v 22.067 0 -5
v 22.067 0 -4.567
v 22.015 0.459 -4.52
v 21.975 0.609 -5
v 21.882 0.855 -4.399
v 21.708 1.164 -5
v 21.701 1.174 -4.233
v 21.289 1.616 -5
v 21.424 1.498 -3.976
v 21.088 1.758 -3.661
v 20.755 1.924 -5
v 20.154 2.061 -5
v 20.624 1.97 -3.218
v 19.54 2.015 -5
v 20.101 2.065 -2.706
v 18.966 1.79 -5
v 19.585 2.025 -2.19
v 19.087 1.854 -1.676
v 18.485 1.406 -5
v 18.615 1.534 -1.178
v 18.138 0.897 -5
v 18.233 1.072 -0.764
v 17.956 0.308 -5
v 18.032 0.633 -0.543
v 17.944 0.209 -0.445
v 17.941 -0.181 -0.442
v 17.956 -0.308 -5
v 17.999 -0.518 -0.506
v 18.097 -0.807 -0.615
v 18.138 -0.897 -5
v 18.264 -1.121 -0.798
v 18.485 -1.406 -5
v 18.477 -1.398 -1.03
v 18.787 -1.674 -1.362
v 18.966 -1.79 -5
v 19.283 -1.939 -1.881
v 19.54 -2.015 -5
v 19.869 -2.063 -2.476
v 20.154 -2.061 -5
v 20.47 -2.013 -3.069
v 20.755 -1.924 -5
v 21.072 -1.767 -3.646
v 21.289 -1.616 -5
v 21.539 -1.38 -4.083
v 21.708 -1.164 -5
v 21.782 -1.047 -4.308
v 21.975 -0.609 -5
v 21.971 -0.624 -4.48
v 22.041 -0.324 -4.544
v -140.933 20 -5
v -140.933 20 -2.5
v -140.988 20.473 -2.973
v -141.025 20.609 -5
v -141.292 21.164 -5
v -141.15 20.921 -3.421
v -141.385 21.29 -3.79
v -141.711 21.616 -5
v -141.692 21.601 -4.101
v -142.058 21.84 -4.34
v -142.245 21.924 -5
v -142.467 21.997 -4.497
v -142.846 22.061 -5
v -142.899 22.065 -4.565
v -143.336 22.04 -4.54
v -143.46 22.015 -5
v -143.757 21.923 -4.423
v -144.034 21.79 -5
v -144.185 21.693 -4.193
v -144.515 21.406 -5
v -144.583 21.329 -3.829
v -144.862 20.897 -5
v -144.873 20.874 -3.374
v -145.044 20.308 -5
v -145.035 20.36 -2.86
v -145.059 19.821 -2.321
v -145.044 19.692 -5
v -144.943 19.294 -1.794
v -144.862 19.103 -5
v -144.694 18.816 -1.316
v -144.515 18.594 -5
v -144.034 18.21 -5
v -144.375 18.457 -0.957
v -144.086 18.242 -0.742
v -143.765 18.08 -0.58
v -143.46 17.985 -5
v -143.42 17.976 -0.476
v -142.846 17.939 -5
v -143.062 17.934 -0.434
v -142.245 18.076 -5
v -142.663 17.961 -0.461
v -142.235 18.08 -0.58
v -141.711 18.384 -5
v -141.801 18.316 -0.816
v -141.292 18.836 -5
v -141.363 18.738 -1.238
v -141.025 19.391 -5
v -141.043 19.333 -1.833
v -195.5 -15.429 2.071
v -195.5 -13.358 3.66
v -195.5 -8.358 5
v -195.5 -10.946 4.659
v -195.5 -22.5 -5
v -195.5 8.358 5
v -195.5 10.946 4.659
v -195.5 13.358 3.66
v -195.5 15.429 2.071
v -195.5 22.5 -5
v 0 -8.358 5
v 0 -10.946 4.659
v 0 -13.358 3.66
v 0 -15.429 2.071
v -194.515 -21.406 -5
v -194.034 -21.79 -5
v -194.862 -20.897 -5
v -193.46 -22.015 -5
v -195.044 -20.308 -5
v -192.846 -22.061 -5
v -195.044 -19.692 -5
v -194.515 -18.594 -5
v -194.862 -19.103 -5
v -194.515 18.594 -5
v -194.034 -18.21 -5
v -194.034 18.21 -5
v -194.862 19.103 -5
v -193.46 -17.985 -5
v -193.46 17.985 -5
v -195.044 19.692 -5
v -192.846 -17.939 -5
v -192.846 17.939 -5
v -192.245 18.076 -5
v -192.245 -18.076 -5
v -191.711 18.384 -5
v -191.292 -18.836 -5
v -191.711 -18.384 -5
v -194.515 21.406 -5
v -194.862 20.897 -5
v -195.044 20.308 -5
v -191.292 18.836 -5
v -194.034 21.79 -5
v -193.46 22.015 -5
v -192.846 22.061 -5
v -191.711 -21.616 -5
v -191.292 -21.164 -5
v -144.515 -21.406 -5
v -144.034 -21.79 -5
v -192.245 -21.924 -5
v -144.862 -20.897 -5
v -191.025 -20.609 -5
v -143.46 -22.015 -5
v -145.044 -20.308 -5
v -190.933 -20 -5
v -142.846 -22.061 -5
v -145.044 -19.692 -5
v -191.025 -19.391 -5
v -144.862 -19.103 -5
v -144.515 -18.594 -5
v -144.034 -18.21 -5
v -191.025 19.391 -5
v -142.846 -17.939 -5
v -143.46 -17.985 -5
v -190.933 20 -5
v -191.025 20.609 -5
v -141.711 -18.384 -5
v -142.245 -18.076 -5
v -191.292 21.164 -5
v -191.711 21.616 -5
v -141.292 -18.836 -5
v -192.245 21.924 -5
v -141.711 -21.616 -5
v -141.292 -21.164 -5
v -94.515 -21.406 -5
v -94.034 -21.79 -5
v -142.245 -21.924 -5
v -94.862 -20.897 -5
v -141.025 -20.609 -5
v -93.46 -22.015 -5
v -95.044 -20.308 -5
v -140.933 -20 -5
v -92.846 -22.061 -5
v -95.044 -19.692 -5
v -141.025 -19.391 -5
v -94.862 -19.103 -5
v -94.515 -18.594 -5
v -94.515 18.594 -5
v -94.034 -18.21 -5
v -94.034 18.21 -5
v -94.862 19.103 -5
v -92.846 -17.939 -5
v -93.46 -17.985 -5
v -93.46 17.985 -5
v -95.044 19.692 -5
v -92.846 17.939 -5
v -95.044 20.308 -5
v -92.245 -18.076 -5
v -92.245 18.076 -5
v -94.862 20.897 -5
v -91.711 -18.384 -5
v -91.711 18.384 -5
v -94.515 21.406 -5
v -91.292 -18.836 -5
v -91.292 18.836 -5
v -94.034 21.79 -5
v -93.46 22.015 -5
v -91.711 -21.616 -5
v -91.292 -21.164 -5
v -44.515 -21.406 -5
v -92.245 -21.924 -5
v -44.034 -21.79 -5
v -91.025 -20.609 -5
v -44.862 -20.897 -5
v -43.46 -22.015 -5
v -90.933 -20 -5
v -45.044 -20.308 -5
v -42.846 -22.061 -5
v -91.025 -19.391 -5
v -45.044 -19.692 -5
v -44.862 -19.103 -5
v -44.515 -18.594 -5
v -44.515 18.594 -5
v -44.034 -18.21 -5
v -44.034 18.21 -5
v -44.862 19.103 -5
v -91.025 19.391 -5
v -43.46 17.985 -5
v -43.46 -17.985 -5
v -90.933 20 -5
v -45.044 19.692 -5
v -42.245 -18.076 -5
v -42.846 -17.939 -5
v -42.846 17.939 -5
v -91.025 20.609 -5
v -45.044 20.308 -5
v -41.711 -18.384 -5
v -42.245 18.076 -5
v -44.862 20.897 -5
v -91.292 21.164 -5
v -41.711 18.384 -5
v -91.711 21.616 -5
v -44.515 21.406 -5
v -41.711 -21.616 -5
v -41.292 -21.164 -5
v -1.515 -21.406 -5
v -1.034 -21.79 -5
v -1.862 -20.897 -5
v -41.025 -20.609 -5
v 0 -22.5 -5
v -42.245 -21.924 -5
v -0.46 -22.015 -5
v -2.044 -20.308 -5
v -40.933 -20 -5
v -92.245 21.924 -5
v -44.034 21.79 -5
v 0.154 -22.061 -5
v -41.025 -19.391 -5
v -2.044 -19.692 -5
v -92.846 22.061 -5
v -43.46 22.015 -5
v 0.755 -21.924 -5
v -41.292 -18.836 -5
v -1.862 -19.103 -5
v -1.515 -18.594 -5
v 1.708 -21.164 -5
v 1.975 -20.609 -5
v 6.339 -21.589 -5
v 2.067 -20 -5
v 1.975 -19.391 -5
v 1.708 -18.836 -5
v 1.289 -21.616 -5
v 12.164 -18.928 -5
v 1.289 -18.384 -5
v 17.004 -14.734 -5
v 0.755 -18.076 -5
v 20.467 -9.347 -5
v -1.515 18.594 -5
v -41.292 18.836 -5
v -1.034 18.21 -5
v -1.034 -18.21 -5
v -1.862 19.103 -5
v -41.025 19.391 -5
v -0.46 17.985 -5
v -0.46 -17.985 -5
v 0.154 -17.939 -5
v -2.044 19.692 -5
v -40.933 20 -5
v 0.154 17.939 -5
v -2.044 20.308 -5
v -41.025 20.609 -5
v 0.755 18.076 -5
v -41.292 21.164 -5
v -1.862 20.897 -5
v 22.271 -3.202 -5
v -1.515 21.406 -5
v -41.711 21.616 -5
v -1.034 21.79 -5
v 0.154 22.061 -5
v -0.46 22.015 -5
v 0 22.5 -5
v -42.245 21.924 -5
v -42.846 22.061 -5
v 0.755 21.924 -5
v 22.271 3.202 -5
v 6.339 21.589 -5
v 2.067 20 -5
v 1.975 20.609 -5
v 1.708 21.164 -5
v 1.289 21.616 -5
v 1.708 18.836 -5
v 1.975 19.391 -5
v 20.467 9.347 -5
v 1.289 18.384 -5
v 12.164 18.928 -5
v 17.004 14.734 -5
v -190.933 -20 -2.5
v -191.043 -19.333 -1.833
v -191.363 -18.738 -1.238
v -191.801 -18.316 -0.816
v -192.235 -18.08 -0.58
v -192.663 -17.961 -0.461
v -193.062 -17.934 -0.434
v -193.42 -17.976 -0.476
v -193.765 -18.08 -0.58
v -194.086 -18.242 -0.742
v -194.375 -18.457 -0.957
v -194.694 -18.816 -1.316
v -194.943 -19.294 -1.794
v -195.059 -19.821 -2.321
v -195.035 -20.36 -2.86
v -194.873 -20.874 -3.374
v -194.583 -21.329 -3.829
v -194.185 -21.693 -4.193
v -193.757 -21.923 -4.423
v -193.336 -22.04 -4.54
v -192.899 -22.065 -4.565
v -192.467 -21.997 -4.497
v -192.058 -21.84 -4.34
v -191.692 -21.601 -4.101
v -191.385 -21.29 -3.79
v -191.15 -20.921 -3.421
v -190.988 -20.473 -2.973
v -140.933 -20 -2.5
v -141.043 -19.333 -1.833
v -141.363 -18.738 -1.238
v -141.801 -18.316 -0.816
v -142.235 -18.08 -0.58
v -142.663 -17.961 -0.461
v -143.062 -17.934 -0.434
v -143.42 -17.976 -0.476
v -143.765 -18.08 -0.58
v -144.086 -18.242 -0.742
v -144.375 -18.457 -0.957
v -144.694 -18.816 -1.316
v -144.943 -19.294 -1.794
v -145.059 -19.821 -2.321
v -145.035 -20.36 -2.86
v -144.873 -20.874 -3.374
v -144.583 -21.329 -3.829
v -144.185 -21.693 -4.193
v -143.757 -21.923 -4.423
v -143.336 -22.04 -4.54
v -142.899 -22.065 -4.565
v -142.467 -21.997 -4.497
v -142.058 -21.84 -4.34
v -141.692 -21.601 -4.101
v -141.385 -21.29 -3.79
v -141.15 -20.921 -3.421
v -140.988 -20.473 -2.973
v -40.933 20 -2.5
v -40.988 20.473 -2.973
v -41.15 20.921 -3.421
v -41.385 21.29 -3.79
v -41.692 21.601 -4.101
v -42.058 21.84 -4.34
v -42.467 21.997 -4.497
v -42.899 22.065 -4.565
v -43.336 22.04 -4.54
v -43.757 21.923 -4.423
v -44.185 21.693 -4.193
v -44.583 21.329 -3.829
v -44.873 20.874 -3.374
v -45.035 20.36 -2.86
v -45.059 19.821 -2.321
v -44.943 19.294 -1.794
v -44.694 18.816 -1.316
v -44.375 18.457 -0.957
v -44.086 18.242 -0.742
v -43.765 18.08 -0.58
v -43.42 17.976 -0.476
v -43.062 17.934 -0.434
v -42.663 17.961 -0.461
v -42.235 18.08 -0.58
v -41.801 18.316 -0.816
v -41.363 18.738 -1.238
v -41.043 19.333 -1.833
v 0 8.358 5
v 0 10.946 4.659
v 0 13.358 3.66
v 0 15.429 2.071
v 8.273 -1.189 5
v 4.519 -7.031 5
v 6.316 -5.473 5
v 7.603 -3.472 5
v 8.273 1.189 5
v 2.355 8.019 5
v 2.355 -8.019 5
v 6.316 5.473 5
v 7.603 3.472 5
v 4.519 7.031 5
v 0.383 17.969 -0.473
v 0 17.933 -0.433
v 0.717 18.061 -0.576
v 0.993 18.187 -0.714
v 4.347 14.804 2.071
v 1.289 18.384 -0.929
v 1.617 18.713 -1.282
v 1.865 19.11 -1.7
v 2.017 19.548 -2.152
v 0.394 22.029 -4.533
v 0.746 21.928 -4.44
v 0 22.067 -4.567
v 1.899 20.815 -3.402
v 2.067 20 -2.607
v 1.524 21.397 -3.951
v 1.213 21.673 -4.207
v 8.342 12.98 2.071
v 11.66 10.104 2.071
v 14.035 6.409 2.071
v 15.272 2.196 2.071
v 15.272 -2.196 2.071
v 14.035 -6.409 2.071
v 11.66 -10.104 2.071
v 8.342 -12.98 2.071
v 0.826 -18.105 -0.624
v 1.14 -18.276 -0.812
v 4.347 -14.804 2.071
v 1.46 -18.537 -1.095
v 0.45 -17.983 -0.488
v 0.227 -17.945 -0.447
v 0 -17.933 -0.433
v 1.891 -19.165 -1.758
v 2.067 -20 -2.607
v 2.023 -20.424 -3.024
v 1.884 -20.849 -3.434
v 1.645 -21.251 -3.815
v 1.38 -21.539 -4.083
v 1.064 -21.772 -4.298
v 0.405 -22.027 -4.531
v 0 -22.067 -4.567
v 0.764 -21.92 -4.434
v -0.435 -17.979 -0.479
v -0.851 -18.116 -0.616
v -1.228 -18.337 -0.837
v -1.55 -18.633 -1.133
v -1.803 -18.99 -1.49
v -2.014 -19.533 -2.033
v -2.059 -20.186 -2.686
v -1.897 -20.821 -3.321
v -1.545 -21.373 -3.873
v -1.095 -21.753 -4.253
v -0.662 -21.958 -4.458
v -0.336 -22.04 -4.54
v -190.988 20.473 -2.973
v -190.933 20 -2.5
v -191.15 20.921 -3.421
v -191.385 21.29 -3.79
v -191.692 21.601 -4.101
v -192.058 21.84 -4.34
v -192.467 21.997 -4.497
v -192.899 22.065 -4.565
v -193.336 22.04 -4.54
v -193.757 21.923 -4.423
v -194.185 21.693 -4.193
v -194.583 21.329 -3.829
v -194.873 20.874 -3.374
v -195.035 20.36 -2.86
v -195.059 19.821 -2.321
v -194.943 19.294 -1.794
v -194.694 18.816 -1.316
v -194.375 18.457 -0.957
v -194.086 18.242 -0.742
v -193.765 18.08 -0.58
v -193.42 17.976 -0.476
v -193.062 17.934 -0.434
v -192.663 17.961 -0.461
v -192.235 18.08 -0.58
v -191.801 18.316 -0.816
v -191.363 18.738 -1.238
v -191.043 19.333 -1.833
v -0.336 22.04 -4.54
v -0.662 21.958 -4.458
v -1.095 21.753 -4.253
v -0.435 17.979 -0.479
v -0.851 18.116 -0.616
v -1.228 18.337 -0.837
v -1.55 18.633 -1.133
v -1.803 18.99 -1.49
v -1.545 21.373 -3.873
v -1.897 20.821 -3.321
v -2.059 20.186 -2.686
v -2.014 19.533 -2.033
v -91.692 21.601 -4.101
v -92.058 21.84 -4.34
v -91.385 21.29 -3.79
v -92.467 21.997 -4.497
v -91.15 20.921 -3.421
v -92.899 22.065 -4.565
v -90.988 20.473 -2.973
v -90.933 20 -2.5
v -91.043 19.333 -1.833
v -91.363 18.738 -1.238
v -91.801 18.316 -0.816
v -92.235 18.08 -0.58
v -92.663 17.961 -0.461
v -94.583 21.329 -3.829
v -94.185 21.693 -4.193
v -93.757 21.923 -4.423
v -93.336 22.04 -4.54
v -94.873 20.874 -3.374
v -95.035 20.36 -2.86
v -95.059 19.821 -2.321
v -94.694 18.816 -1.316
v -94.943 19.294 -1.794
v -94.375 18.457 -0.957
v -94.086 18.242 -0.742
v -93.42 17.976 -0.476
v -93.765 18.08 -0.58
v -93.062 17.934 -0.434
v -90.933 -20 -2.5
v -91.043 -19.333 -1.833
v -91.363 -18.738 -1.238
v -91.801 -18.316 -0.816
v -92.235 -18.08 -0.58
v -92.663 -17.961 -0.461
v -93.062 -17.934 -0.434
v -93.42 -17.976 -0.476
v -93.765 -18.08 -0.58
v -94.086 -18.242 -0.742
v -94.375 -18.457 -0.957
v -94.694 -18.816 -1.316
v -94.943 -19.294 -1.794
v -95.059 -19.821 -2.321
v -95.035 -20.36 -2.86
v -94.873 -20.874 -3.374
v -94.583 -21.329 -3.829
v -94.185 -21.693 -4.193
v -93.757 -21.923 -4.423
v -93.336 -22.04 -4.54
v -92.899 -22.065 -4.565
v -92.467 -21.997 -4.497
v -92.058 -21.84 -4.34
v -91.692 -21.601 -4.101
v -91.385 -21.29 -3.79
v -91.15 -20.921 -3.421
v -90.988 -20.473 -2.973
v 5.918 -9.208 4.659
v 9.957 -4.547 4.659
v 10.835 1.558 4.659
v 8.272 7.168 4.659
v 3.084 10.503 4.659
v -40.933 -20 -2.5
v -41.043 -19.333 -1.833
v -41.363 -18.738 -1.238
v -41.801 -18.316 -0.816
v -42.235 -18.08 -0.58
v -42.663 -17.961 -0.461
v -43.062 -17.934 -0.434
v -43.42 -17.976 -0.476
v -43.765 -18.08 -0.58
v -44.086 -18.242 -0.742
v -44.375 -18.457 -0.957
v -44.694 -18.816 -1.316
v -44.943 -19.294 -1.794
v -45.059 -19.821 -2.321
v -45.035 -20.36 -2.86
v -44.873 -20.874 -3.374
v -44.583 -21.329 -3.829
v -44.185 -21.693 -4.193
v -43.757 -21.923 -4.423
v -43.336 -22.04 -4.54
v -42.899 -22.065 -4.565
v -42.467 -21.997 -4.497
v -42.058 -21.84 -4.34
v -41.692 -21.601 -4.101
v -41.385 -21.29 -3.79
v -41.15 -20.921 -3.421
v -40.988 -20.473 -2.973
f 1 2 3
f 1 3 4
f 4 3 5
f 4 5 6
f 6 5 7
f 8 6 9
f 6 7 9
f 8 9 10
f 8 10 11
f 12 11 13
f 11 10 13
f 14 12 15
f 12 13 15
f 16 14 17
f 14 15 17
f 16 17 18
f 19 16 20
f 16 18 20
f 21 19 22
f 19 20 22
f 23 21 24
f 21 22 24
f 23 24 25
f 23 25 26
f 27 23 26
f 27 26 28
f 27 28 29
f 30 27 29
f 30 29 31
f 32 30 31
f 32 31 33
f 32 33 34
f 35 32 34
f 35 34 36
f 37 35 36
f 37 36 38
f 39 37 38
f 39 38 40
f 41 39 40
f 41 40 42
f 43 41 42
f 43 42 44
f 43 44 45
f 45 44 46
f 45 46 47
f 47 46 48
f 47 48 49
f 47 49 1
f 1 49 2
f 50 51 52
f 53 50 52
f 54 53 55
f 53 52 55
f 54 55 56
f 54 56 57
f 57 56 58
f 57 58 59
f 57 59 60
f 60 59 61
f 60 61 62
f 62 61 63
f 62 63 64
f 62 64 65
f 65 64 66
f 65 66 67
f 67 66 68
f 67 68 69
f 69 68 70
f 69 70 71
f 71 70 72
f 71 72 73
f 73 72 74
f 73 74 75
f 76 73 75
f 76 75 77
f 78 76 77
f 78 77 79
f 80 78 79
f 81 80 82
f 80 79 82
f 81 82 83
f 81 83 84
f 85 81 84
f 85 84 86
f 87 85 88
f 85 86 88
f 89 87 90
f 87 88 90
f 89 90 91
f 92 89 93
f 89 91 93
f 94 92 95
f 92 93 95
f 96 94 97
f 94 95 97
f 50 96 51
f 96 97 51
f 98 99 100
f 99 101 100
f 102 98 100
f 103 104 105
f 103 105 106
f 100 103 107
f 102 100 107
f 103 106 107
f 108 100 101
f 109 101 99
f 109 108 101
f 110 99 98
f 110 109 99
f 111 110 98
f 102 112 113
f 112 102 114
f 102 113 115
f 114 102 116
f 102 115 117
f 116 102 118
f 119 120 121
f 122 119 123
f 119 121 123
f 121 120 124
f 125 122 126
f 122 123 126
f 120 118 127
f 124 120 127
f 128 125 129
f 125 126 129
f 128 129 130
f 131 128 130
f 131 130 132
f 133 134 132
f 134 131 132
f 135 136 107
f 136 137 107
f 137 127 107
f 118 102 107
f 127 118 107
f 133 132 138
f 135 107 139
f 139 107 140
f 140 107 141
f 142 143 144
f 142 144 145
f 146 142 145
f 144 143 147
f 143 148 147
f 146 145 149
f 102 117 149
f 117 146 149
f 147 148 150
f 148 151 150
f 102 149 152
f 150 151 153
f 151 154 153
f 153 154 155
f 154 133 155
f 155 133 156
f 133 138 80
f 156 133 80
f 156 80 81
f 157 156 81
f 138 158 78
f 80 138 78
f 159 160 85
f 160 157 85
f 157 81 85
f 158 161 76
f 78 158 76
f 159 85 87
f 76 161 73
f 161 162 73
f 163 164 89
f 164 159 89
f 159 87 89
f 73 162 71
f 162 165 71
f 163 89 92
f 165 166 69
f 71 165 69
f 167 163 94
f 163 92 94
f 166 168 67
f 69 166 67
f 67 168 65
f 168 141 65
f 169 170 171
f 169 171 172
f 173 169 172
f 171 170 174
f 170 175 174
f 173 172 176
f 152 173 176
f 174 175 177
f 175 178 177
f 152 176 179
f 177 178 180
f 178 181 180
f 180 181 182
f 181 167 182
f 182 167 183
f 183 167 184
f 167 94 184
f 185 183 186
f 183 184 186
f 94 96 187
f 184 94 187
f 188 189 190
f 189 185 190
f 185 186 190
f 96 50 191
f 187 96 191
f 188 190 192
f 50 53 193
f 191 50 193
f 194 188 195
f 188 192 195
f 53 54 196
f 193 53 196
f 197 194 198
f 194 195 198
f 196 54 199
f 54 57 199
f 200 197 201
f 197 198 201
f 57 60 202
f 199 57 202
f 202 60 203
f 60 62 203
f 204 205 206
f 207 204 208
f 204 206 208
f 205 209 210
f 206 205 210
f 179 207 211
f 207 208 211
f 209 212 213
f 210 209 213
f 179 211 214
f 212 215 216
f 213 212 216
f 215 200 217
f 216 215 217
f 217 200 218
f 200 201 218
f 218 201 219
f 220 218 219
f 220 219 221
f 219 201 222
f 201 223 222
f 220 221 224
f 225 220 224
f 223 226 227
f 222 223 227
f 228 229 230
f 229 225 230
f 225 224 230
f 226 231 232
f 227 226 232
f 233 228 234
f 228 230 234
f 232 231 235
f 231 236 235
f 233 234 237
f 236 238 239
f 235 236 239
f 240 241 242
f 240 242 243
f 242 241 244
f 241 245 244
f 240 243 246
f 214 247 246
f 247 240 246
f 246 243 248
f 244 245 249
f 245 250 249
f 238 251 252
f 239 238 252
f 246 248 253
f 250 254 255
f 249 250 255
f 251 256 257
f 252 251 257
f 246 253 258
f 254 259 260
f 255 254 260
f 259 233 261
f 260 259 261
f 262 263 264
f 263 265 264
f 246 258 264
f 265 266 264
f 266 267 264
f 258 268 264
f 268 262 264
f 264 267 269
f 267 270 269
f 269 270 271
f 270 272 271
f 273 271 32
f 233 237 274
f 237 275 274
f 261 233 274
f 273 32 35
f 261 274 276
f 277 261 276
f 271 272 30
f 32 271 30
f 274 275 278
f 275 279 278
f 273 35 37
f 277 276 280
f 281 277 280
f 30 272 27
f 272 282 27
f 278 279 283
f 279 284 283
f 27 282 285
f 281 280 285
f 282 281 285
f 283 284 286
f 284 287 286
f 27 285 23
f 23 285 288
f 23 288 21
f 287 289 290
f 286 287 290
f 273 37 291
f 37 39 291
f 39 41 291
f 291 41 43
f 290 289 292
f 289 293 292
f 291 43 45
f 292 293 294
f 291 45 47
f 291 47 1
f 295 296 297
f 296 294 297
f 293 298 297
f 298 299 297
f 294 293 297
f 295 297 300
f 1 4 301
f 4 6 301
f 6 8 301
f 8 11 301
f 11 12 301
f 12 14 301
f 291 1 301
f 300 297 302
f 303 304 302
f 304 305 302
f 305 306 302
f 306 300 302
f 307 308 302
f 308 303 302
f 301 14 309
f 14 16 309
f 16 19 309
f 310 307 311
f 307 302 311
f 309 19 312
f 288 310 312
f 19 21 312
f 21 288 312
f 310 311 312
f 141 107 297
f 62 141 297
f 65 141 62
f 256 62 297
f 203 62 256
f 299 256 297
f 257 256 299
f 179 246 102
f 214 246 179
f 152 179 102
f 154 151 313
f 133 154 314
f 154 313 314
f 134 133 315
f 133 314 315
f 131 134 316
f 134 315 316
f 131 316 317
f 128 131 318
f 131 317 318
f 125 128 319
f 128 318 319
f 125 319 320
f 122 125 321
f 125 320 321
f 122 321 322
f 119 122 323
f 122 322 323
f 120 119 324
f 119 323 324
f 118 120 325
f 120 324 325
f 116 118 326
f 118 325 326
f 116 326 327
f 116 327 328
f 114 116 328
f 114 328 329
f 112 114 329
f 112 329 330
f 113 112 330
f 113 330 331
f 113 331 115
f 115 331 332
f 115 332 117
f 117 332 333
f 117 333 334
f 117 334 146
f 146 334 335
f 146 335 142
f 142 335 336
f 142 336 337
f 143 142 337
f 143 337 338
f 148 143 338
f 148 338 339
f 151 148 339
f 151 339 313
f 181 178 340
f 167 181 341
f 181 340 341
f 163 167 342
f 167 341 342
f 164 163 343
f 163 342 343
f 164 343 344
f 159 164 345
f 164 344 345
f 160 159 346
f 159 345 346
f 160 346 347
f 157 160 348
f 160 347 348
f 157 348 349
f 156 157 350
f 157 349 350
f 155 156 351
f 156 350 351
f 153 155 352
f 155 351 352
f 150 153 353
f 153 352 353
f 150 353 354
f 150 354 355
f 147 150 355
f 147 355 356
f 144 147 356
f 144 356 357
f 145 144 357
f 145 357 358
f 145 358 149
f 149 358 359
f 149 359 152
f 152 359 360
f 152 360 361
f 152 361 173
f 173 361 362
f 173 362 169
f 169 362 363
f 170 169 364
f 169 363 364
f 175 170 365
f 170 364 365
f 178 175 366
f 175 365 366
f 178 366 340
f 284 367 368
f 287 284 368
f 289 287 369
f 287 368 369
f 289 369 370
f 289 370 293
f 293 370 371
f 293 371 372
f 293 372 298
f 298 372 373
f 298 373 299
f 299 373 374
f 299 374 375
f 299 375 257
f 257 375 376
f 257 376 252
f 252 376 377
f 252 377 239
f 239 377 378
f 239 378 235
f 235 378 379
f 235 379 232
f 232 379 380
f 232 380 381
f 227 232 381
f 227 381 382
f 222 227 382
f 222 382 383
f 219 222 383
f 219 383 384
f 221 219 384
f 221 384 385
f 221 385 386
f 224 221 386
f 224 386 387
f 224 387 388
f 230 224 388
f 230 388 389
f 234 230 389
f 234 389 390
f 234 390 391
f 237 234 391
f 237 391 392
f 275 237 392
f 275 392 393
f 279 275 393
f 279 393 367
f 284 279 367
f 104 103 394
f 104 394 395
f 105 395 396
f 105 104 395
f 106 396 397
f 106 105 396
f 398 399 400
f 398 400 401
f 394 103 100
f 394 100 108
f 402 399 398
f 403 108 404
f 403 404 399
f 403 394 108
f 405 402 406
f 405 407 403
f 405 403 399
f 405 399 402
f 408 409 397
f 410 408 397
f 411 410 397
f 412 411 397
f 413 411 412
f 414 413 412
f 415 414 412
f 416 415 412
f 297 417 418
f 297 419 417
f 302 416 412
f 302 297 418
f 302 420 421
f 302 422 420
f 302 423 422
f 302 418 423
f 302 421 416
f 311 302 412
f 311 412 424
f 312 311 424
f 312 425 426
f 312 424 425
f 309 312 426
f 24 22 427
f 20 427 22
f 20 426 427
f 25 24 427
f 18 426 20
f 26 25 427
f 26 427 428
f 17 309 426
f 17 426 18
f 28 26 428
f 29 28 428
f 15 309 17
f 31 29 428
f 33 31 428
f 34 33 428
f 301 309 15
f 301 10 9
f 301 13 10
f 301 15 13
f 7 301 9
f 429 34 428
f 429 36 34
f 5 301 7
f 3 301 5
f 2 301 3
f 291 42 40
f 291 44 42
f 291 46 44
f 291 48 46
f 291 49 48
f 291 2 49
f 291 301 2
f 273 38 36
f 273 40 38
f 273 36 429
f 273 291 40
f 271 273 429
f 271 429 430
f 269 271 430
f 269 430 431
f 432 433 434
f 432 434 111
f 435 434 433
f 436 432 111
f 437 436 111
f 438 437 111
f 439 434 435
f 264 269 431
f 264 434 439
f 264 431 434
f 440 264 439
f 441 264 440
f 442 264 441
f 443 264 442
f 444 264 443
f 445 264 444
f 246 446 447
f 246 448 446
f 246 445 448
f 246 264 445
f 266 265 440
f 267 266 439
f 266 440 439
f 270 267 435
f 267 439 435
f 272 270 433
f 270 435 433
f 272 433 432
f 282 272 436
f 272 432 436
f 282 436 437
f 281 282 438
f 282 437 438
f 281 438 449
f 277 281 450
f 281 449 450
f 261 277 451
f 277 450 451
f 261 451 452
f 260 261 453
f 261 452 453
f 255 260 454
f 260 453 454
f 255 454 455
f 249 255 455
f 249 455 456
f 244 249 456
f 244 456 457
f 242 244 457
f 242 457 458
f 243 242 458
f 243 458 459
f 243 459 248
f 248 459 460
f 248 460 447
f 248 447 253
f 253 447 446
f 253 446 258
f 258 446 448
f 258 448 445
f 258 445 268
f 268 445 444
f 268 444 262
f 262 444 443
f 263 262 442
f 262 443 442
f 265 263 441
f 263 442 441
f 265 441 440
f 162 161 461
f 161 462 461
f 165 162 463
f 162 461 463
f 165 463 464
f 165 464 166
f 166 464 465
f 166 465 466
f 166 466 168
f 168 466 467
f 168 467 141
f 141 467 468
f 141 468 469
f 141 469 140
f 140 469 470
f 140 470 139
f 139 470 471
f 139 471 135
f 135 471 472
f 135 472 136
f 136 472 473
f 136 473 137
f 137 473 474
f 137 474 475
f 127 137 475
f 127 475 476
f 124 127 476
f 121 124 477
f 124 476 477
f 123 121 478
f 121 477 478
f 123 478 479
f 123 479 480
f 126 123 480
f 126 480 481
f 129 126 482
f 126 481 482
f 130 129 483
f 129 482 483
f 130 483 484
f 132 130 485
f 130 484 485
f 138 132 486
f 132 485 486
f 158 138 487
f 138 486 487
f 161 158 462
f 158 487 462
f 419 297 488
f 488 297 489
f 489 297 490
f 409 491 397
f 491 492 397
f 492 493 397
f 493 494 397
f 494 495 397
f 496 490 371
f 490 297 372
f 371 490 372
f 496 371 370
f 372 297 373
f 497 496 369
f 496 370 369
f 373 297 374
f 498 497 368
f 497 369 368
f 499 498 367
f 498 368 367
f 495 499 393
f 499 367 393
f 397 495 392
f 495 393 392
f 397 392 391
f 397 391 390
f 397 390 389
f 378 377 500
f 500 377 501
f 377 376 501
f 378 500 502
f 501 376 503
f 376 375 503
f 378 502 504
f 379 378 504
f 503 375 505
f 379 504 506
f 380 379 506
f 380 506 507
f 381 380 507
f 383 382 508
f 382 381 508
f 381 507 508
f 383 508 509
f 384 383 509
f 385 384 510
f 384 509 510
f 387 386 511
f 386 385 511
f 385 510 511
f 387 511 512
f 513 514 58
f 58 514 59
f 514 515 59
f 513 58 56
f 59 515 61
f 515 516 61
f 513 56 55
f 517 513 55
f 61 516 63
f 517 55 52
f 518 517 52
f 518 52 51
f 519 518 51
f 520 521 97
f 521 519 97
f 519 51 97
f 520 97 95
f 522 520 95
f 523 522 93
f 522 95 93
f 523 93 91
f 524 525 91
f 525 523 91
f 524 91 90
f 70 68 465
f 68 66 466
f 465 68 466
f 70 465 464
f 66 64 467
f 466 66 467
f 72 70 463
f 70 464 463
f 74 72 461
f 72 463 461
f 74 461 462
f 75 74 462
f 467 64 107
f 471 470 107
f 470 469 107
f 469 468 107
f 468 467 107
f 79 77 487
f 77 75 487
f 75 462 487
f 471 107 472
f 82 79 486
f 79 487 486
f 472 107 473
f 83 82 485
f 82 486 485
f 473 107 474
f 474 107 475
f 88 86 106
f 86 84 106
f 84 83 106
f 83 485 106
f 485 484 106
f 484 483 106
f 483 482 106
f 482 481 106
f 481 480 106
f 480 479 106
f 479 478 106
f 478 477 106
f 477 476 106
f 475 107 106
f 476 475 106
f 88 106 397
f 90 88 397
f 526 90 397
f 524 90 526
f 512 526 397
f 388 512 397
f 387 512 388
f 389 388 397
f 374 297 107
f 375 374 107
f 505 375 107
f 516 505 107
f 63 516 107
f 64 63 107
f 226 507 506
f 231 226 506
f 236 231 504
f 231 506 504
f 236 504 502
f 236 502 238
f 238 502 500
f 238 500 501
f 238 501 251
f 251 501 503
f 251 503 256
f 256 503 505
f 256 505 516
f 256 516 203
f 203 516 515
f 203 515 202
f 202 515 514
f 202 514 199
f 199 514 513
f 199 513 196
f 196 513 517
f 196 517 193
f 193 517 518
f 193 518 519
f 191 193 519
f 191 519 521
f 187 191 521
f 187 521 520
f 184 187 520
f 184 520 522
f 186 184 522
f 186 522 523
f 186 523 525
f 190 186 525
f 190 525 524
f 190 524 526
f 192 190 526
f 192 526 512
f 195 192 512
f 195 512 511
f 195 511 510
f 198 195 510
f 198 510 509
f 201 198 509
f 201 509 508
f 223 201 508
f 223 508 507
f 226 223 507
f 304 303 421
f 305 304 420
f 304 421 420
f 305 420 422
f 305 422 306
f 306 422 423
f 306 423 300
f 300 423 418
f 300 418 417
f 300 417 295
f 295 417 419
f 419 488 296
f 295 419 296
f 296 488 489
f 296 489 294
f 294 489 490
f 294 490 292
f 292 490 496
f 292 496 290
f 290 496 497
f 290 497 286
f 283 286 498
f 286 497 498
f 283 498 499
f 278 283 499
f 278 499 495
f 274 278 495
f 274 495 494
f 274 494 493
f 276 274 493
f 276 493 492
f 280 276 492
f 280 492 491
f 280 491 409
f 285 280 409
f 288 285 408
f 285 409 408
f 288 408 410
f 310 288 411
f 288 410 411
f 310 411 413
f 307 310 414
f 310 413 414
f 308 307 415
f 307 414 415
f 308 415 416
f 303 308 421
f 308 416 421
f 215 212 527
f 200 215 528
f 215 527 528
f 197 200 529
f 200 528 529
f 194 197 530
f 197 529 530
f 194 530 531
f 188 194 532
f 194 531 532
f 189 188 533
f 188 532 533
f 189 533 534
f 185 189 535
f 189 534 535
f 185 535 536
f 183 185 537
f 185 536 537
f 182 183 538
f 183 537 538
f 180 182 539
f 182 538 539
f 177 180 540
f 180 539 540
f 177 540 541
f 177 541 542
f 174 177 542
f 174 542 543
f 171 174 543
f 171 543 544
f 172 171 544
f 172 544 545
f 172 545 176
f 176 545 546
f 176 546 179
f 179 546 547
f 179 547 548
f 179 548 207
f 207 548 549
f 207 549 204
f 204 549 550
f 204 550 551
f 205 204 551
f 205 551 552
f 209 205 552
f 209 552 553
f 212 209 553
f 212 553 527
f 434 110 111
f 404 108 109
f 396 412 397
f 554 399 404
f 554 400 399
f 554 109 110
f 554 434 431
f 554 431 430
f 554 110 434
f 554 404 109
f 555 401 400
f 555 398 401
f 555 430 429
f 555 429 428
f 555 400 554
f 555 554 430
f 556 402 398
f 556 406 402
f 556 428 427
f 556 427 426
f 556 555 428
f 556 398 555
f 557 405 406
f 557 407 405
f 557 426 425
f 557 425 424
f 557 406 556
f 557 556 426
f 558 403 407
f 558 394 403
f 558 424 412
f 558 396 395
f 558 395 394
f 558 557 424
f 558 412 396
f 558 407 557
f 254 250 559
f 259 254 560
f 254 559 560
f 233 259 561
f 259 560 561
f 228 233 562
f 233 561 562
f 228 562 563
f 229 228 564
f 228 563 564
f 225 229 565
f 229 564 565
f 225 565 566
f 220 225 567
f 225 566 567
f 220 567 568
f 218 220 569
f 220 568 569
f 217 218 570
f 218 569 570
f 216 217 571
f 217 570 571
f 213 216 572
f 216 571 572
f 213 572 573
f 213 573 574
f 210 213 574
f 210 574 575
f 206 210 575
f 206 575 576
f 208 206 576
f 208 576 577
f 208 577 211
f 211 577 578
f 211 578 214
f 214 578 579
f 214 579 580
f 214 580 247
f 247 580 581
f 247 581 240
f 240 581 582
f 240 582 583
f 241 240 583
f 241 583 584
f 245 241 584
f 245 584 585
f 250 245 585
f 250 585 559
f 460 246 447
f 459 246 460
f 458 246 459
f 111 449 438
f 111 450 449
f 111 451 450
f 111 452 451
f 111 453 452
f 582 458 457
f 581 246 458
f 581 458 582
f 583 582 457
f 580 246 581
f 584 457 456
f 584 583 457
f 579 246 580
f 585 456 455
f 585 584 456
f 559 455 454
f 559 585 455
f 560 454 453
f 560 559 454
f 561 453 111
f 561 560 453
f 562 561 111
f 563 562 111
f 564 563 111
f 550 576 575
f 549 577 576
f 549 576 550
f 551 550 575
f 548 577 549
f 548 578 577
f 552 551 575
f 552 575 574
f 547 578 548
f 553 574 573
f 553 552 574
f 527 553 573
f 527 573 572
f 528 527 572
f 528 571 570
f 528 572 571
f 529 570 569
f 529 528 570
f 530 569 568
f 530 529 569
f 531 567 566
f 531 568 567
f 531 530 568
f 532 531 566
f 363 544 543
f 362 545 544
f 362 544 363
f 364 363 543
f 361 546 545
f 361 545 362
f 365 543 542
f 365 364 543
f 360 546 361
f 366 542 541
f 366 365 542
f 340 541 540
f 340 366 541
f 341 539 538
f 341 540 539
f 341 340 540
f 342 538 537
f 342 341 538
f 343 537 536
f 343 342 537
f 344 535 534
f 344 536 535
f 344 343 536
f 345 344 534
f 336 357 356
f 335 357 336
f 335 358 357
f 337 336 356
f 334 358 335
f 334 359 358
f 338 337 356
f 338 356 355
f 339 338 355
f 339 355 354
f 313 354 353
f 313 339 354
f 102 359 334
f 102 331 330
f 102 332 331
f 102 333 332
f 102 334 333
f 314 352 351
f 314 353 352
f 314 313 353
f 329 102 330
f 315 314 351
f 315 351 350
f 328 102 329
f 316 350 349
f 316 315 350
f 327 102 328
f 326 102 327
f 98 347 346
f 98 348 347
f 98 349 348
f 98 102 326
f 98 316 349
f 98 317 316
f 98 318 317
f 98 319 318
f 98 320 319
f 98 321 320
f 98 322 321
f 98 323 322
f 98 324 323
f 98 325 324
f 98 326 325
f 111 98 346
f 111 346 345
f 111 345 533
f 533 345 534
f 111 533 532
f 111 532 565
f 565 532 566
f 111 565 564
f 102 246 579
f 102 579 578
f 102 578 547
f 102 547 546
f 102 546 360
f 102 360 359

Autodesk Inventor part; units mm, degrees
ref_plane "YZ Plane" through (0, 0, 0) normal (1, 0, 0) x (0, 1, 0)
ref_plane "XZ Plane" through (0, 0, 0) normal (0, 1, 0) x (-1, 0, 0)
ref_plane "XY Plane" through (0, 0, 0) normal (0, 0, 1) x (1, 0, 0)
sketch "Sketch2" plane through (0, 0, 0) normal (0, 0, 1) x (1, 0, 0)
  circle A0 centre (-43, -20) radius 2.067
  circle A1 centre (-143, -20) radius 2.067
  circle A2 centre (-93, 20) radius 2.067
  circle A3 centre (-193, -20) radius 2.067
  circle A4 centre (20, 0) radius 2.067
  circle A5 centre (0, 20) radius 2.067
  circle A6 centre (-193, 20) radius 2.067
  circle A7 centre (-143, 20) radius 2.067
  circle A8 centre (-43, 20) radius 2.067
  circle A9 centre (-93, -20) radius 2.067
  circle A10 centre (0, -20) radius 2.067
  line L0 (-195.5, -22.5) -> (-195.5, 22.5)
  line L1 (-195.5, -22.5) -> (0, -22.5)
  arc A11 (0, -22.5) -> (0, 22.5) centre (0, 0) ccw
  line L2 (-195.5, 22.5) -> (0, 22.5)
  line L3 (0, -17.5) -> (-190.5, -17.5)
  line L4 (-190.5, -17.5) -> (-190.5, 17.5)
  line L5 (-190.5, 17.5) -> (0, 17.5)
  arc A12 (0, -17.5) -> (0, 17.5) centre (0, 0) ccw
  point P0 (-197.5, 0)
extrude "Extrusion1" add sketch "Sketch2" along normal mid plane 10 contours L0 L2 A11 L1 | L3 L4 L5 A12
chamfer "Chamfer1" distance 10 angle 45 3 edges at (-97.75, 22.5, 5) (22.5, 0, 5) (-97.75, -22.5, 5)
fillet "Fillet2" radius 10 3 edges at (-97.75, -12.5, 5) (12.5, 0, 5) (-97.75, 12.5, 5)
properties part number "Cover for robot head" material "Steel, Alloy"
